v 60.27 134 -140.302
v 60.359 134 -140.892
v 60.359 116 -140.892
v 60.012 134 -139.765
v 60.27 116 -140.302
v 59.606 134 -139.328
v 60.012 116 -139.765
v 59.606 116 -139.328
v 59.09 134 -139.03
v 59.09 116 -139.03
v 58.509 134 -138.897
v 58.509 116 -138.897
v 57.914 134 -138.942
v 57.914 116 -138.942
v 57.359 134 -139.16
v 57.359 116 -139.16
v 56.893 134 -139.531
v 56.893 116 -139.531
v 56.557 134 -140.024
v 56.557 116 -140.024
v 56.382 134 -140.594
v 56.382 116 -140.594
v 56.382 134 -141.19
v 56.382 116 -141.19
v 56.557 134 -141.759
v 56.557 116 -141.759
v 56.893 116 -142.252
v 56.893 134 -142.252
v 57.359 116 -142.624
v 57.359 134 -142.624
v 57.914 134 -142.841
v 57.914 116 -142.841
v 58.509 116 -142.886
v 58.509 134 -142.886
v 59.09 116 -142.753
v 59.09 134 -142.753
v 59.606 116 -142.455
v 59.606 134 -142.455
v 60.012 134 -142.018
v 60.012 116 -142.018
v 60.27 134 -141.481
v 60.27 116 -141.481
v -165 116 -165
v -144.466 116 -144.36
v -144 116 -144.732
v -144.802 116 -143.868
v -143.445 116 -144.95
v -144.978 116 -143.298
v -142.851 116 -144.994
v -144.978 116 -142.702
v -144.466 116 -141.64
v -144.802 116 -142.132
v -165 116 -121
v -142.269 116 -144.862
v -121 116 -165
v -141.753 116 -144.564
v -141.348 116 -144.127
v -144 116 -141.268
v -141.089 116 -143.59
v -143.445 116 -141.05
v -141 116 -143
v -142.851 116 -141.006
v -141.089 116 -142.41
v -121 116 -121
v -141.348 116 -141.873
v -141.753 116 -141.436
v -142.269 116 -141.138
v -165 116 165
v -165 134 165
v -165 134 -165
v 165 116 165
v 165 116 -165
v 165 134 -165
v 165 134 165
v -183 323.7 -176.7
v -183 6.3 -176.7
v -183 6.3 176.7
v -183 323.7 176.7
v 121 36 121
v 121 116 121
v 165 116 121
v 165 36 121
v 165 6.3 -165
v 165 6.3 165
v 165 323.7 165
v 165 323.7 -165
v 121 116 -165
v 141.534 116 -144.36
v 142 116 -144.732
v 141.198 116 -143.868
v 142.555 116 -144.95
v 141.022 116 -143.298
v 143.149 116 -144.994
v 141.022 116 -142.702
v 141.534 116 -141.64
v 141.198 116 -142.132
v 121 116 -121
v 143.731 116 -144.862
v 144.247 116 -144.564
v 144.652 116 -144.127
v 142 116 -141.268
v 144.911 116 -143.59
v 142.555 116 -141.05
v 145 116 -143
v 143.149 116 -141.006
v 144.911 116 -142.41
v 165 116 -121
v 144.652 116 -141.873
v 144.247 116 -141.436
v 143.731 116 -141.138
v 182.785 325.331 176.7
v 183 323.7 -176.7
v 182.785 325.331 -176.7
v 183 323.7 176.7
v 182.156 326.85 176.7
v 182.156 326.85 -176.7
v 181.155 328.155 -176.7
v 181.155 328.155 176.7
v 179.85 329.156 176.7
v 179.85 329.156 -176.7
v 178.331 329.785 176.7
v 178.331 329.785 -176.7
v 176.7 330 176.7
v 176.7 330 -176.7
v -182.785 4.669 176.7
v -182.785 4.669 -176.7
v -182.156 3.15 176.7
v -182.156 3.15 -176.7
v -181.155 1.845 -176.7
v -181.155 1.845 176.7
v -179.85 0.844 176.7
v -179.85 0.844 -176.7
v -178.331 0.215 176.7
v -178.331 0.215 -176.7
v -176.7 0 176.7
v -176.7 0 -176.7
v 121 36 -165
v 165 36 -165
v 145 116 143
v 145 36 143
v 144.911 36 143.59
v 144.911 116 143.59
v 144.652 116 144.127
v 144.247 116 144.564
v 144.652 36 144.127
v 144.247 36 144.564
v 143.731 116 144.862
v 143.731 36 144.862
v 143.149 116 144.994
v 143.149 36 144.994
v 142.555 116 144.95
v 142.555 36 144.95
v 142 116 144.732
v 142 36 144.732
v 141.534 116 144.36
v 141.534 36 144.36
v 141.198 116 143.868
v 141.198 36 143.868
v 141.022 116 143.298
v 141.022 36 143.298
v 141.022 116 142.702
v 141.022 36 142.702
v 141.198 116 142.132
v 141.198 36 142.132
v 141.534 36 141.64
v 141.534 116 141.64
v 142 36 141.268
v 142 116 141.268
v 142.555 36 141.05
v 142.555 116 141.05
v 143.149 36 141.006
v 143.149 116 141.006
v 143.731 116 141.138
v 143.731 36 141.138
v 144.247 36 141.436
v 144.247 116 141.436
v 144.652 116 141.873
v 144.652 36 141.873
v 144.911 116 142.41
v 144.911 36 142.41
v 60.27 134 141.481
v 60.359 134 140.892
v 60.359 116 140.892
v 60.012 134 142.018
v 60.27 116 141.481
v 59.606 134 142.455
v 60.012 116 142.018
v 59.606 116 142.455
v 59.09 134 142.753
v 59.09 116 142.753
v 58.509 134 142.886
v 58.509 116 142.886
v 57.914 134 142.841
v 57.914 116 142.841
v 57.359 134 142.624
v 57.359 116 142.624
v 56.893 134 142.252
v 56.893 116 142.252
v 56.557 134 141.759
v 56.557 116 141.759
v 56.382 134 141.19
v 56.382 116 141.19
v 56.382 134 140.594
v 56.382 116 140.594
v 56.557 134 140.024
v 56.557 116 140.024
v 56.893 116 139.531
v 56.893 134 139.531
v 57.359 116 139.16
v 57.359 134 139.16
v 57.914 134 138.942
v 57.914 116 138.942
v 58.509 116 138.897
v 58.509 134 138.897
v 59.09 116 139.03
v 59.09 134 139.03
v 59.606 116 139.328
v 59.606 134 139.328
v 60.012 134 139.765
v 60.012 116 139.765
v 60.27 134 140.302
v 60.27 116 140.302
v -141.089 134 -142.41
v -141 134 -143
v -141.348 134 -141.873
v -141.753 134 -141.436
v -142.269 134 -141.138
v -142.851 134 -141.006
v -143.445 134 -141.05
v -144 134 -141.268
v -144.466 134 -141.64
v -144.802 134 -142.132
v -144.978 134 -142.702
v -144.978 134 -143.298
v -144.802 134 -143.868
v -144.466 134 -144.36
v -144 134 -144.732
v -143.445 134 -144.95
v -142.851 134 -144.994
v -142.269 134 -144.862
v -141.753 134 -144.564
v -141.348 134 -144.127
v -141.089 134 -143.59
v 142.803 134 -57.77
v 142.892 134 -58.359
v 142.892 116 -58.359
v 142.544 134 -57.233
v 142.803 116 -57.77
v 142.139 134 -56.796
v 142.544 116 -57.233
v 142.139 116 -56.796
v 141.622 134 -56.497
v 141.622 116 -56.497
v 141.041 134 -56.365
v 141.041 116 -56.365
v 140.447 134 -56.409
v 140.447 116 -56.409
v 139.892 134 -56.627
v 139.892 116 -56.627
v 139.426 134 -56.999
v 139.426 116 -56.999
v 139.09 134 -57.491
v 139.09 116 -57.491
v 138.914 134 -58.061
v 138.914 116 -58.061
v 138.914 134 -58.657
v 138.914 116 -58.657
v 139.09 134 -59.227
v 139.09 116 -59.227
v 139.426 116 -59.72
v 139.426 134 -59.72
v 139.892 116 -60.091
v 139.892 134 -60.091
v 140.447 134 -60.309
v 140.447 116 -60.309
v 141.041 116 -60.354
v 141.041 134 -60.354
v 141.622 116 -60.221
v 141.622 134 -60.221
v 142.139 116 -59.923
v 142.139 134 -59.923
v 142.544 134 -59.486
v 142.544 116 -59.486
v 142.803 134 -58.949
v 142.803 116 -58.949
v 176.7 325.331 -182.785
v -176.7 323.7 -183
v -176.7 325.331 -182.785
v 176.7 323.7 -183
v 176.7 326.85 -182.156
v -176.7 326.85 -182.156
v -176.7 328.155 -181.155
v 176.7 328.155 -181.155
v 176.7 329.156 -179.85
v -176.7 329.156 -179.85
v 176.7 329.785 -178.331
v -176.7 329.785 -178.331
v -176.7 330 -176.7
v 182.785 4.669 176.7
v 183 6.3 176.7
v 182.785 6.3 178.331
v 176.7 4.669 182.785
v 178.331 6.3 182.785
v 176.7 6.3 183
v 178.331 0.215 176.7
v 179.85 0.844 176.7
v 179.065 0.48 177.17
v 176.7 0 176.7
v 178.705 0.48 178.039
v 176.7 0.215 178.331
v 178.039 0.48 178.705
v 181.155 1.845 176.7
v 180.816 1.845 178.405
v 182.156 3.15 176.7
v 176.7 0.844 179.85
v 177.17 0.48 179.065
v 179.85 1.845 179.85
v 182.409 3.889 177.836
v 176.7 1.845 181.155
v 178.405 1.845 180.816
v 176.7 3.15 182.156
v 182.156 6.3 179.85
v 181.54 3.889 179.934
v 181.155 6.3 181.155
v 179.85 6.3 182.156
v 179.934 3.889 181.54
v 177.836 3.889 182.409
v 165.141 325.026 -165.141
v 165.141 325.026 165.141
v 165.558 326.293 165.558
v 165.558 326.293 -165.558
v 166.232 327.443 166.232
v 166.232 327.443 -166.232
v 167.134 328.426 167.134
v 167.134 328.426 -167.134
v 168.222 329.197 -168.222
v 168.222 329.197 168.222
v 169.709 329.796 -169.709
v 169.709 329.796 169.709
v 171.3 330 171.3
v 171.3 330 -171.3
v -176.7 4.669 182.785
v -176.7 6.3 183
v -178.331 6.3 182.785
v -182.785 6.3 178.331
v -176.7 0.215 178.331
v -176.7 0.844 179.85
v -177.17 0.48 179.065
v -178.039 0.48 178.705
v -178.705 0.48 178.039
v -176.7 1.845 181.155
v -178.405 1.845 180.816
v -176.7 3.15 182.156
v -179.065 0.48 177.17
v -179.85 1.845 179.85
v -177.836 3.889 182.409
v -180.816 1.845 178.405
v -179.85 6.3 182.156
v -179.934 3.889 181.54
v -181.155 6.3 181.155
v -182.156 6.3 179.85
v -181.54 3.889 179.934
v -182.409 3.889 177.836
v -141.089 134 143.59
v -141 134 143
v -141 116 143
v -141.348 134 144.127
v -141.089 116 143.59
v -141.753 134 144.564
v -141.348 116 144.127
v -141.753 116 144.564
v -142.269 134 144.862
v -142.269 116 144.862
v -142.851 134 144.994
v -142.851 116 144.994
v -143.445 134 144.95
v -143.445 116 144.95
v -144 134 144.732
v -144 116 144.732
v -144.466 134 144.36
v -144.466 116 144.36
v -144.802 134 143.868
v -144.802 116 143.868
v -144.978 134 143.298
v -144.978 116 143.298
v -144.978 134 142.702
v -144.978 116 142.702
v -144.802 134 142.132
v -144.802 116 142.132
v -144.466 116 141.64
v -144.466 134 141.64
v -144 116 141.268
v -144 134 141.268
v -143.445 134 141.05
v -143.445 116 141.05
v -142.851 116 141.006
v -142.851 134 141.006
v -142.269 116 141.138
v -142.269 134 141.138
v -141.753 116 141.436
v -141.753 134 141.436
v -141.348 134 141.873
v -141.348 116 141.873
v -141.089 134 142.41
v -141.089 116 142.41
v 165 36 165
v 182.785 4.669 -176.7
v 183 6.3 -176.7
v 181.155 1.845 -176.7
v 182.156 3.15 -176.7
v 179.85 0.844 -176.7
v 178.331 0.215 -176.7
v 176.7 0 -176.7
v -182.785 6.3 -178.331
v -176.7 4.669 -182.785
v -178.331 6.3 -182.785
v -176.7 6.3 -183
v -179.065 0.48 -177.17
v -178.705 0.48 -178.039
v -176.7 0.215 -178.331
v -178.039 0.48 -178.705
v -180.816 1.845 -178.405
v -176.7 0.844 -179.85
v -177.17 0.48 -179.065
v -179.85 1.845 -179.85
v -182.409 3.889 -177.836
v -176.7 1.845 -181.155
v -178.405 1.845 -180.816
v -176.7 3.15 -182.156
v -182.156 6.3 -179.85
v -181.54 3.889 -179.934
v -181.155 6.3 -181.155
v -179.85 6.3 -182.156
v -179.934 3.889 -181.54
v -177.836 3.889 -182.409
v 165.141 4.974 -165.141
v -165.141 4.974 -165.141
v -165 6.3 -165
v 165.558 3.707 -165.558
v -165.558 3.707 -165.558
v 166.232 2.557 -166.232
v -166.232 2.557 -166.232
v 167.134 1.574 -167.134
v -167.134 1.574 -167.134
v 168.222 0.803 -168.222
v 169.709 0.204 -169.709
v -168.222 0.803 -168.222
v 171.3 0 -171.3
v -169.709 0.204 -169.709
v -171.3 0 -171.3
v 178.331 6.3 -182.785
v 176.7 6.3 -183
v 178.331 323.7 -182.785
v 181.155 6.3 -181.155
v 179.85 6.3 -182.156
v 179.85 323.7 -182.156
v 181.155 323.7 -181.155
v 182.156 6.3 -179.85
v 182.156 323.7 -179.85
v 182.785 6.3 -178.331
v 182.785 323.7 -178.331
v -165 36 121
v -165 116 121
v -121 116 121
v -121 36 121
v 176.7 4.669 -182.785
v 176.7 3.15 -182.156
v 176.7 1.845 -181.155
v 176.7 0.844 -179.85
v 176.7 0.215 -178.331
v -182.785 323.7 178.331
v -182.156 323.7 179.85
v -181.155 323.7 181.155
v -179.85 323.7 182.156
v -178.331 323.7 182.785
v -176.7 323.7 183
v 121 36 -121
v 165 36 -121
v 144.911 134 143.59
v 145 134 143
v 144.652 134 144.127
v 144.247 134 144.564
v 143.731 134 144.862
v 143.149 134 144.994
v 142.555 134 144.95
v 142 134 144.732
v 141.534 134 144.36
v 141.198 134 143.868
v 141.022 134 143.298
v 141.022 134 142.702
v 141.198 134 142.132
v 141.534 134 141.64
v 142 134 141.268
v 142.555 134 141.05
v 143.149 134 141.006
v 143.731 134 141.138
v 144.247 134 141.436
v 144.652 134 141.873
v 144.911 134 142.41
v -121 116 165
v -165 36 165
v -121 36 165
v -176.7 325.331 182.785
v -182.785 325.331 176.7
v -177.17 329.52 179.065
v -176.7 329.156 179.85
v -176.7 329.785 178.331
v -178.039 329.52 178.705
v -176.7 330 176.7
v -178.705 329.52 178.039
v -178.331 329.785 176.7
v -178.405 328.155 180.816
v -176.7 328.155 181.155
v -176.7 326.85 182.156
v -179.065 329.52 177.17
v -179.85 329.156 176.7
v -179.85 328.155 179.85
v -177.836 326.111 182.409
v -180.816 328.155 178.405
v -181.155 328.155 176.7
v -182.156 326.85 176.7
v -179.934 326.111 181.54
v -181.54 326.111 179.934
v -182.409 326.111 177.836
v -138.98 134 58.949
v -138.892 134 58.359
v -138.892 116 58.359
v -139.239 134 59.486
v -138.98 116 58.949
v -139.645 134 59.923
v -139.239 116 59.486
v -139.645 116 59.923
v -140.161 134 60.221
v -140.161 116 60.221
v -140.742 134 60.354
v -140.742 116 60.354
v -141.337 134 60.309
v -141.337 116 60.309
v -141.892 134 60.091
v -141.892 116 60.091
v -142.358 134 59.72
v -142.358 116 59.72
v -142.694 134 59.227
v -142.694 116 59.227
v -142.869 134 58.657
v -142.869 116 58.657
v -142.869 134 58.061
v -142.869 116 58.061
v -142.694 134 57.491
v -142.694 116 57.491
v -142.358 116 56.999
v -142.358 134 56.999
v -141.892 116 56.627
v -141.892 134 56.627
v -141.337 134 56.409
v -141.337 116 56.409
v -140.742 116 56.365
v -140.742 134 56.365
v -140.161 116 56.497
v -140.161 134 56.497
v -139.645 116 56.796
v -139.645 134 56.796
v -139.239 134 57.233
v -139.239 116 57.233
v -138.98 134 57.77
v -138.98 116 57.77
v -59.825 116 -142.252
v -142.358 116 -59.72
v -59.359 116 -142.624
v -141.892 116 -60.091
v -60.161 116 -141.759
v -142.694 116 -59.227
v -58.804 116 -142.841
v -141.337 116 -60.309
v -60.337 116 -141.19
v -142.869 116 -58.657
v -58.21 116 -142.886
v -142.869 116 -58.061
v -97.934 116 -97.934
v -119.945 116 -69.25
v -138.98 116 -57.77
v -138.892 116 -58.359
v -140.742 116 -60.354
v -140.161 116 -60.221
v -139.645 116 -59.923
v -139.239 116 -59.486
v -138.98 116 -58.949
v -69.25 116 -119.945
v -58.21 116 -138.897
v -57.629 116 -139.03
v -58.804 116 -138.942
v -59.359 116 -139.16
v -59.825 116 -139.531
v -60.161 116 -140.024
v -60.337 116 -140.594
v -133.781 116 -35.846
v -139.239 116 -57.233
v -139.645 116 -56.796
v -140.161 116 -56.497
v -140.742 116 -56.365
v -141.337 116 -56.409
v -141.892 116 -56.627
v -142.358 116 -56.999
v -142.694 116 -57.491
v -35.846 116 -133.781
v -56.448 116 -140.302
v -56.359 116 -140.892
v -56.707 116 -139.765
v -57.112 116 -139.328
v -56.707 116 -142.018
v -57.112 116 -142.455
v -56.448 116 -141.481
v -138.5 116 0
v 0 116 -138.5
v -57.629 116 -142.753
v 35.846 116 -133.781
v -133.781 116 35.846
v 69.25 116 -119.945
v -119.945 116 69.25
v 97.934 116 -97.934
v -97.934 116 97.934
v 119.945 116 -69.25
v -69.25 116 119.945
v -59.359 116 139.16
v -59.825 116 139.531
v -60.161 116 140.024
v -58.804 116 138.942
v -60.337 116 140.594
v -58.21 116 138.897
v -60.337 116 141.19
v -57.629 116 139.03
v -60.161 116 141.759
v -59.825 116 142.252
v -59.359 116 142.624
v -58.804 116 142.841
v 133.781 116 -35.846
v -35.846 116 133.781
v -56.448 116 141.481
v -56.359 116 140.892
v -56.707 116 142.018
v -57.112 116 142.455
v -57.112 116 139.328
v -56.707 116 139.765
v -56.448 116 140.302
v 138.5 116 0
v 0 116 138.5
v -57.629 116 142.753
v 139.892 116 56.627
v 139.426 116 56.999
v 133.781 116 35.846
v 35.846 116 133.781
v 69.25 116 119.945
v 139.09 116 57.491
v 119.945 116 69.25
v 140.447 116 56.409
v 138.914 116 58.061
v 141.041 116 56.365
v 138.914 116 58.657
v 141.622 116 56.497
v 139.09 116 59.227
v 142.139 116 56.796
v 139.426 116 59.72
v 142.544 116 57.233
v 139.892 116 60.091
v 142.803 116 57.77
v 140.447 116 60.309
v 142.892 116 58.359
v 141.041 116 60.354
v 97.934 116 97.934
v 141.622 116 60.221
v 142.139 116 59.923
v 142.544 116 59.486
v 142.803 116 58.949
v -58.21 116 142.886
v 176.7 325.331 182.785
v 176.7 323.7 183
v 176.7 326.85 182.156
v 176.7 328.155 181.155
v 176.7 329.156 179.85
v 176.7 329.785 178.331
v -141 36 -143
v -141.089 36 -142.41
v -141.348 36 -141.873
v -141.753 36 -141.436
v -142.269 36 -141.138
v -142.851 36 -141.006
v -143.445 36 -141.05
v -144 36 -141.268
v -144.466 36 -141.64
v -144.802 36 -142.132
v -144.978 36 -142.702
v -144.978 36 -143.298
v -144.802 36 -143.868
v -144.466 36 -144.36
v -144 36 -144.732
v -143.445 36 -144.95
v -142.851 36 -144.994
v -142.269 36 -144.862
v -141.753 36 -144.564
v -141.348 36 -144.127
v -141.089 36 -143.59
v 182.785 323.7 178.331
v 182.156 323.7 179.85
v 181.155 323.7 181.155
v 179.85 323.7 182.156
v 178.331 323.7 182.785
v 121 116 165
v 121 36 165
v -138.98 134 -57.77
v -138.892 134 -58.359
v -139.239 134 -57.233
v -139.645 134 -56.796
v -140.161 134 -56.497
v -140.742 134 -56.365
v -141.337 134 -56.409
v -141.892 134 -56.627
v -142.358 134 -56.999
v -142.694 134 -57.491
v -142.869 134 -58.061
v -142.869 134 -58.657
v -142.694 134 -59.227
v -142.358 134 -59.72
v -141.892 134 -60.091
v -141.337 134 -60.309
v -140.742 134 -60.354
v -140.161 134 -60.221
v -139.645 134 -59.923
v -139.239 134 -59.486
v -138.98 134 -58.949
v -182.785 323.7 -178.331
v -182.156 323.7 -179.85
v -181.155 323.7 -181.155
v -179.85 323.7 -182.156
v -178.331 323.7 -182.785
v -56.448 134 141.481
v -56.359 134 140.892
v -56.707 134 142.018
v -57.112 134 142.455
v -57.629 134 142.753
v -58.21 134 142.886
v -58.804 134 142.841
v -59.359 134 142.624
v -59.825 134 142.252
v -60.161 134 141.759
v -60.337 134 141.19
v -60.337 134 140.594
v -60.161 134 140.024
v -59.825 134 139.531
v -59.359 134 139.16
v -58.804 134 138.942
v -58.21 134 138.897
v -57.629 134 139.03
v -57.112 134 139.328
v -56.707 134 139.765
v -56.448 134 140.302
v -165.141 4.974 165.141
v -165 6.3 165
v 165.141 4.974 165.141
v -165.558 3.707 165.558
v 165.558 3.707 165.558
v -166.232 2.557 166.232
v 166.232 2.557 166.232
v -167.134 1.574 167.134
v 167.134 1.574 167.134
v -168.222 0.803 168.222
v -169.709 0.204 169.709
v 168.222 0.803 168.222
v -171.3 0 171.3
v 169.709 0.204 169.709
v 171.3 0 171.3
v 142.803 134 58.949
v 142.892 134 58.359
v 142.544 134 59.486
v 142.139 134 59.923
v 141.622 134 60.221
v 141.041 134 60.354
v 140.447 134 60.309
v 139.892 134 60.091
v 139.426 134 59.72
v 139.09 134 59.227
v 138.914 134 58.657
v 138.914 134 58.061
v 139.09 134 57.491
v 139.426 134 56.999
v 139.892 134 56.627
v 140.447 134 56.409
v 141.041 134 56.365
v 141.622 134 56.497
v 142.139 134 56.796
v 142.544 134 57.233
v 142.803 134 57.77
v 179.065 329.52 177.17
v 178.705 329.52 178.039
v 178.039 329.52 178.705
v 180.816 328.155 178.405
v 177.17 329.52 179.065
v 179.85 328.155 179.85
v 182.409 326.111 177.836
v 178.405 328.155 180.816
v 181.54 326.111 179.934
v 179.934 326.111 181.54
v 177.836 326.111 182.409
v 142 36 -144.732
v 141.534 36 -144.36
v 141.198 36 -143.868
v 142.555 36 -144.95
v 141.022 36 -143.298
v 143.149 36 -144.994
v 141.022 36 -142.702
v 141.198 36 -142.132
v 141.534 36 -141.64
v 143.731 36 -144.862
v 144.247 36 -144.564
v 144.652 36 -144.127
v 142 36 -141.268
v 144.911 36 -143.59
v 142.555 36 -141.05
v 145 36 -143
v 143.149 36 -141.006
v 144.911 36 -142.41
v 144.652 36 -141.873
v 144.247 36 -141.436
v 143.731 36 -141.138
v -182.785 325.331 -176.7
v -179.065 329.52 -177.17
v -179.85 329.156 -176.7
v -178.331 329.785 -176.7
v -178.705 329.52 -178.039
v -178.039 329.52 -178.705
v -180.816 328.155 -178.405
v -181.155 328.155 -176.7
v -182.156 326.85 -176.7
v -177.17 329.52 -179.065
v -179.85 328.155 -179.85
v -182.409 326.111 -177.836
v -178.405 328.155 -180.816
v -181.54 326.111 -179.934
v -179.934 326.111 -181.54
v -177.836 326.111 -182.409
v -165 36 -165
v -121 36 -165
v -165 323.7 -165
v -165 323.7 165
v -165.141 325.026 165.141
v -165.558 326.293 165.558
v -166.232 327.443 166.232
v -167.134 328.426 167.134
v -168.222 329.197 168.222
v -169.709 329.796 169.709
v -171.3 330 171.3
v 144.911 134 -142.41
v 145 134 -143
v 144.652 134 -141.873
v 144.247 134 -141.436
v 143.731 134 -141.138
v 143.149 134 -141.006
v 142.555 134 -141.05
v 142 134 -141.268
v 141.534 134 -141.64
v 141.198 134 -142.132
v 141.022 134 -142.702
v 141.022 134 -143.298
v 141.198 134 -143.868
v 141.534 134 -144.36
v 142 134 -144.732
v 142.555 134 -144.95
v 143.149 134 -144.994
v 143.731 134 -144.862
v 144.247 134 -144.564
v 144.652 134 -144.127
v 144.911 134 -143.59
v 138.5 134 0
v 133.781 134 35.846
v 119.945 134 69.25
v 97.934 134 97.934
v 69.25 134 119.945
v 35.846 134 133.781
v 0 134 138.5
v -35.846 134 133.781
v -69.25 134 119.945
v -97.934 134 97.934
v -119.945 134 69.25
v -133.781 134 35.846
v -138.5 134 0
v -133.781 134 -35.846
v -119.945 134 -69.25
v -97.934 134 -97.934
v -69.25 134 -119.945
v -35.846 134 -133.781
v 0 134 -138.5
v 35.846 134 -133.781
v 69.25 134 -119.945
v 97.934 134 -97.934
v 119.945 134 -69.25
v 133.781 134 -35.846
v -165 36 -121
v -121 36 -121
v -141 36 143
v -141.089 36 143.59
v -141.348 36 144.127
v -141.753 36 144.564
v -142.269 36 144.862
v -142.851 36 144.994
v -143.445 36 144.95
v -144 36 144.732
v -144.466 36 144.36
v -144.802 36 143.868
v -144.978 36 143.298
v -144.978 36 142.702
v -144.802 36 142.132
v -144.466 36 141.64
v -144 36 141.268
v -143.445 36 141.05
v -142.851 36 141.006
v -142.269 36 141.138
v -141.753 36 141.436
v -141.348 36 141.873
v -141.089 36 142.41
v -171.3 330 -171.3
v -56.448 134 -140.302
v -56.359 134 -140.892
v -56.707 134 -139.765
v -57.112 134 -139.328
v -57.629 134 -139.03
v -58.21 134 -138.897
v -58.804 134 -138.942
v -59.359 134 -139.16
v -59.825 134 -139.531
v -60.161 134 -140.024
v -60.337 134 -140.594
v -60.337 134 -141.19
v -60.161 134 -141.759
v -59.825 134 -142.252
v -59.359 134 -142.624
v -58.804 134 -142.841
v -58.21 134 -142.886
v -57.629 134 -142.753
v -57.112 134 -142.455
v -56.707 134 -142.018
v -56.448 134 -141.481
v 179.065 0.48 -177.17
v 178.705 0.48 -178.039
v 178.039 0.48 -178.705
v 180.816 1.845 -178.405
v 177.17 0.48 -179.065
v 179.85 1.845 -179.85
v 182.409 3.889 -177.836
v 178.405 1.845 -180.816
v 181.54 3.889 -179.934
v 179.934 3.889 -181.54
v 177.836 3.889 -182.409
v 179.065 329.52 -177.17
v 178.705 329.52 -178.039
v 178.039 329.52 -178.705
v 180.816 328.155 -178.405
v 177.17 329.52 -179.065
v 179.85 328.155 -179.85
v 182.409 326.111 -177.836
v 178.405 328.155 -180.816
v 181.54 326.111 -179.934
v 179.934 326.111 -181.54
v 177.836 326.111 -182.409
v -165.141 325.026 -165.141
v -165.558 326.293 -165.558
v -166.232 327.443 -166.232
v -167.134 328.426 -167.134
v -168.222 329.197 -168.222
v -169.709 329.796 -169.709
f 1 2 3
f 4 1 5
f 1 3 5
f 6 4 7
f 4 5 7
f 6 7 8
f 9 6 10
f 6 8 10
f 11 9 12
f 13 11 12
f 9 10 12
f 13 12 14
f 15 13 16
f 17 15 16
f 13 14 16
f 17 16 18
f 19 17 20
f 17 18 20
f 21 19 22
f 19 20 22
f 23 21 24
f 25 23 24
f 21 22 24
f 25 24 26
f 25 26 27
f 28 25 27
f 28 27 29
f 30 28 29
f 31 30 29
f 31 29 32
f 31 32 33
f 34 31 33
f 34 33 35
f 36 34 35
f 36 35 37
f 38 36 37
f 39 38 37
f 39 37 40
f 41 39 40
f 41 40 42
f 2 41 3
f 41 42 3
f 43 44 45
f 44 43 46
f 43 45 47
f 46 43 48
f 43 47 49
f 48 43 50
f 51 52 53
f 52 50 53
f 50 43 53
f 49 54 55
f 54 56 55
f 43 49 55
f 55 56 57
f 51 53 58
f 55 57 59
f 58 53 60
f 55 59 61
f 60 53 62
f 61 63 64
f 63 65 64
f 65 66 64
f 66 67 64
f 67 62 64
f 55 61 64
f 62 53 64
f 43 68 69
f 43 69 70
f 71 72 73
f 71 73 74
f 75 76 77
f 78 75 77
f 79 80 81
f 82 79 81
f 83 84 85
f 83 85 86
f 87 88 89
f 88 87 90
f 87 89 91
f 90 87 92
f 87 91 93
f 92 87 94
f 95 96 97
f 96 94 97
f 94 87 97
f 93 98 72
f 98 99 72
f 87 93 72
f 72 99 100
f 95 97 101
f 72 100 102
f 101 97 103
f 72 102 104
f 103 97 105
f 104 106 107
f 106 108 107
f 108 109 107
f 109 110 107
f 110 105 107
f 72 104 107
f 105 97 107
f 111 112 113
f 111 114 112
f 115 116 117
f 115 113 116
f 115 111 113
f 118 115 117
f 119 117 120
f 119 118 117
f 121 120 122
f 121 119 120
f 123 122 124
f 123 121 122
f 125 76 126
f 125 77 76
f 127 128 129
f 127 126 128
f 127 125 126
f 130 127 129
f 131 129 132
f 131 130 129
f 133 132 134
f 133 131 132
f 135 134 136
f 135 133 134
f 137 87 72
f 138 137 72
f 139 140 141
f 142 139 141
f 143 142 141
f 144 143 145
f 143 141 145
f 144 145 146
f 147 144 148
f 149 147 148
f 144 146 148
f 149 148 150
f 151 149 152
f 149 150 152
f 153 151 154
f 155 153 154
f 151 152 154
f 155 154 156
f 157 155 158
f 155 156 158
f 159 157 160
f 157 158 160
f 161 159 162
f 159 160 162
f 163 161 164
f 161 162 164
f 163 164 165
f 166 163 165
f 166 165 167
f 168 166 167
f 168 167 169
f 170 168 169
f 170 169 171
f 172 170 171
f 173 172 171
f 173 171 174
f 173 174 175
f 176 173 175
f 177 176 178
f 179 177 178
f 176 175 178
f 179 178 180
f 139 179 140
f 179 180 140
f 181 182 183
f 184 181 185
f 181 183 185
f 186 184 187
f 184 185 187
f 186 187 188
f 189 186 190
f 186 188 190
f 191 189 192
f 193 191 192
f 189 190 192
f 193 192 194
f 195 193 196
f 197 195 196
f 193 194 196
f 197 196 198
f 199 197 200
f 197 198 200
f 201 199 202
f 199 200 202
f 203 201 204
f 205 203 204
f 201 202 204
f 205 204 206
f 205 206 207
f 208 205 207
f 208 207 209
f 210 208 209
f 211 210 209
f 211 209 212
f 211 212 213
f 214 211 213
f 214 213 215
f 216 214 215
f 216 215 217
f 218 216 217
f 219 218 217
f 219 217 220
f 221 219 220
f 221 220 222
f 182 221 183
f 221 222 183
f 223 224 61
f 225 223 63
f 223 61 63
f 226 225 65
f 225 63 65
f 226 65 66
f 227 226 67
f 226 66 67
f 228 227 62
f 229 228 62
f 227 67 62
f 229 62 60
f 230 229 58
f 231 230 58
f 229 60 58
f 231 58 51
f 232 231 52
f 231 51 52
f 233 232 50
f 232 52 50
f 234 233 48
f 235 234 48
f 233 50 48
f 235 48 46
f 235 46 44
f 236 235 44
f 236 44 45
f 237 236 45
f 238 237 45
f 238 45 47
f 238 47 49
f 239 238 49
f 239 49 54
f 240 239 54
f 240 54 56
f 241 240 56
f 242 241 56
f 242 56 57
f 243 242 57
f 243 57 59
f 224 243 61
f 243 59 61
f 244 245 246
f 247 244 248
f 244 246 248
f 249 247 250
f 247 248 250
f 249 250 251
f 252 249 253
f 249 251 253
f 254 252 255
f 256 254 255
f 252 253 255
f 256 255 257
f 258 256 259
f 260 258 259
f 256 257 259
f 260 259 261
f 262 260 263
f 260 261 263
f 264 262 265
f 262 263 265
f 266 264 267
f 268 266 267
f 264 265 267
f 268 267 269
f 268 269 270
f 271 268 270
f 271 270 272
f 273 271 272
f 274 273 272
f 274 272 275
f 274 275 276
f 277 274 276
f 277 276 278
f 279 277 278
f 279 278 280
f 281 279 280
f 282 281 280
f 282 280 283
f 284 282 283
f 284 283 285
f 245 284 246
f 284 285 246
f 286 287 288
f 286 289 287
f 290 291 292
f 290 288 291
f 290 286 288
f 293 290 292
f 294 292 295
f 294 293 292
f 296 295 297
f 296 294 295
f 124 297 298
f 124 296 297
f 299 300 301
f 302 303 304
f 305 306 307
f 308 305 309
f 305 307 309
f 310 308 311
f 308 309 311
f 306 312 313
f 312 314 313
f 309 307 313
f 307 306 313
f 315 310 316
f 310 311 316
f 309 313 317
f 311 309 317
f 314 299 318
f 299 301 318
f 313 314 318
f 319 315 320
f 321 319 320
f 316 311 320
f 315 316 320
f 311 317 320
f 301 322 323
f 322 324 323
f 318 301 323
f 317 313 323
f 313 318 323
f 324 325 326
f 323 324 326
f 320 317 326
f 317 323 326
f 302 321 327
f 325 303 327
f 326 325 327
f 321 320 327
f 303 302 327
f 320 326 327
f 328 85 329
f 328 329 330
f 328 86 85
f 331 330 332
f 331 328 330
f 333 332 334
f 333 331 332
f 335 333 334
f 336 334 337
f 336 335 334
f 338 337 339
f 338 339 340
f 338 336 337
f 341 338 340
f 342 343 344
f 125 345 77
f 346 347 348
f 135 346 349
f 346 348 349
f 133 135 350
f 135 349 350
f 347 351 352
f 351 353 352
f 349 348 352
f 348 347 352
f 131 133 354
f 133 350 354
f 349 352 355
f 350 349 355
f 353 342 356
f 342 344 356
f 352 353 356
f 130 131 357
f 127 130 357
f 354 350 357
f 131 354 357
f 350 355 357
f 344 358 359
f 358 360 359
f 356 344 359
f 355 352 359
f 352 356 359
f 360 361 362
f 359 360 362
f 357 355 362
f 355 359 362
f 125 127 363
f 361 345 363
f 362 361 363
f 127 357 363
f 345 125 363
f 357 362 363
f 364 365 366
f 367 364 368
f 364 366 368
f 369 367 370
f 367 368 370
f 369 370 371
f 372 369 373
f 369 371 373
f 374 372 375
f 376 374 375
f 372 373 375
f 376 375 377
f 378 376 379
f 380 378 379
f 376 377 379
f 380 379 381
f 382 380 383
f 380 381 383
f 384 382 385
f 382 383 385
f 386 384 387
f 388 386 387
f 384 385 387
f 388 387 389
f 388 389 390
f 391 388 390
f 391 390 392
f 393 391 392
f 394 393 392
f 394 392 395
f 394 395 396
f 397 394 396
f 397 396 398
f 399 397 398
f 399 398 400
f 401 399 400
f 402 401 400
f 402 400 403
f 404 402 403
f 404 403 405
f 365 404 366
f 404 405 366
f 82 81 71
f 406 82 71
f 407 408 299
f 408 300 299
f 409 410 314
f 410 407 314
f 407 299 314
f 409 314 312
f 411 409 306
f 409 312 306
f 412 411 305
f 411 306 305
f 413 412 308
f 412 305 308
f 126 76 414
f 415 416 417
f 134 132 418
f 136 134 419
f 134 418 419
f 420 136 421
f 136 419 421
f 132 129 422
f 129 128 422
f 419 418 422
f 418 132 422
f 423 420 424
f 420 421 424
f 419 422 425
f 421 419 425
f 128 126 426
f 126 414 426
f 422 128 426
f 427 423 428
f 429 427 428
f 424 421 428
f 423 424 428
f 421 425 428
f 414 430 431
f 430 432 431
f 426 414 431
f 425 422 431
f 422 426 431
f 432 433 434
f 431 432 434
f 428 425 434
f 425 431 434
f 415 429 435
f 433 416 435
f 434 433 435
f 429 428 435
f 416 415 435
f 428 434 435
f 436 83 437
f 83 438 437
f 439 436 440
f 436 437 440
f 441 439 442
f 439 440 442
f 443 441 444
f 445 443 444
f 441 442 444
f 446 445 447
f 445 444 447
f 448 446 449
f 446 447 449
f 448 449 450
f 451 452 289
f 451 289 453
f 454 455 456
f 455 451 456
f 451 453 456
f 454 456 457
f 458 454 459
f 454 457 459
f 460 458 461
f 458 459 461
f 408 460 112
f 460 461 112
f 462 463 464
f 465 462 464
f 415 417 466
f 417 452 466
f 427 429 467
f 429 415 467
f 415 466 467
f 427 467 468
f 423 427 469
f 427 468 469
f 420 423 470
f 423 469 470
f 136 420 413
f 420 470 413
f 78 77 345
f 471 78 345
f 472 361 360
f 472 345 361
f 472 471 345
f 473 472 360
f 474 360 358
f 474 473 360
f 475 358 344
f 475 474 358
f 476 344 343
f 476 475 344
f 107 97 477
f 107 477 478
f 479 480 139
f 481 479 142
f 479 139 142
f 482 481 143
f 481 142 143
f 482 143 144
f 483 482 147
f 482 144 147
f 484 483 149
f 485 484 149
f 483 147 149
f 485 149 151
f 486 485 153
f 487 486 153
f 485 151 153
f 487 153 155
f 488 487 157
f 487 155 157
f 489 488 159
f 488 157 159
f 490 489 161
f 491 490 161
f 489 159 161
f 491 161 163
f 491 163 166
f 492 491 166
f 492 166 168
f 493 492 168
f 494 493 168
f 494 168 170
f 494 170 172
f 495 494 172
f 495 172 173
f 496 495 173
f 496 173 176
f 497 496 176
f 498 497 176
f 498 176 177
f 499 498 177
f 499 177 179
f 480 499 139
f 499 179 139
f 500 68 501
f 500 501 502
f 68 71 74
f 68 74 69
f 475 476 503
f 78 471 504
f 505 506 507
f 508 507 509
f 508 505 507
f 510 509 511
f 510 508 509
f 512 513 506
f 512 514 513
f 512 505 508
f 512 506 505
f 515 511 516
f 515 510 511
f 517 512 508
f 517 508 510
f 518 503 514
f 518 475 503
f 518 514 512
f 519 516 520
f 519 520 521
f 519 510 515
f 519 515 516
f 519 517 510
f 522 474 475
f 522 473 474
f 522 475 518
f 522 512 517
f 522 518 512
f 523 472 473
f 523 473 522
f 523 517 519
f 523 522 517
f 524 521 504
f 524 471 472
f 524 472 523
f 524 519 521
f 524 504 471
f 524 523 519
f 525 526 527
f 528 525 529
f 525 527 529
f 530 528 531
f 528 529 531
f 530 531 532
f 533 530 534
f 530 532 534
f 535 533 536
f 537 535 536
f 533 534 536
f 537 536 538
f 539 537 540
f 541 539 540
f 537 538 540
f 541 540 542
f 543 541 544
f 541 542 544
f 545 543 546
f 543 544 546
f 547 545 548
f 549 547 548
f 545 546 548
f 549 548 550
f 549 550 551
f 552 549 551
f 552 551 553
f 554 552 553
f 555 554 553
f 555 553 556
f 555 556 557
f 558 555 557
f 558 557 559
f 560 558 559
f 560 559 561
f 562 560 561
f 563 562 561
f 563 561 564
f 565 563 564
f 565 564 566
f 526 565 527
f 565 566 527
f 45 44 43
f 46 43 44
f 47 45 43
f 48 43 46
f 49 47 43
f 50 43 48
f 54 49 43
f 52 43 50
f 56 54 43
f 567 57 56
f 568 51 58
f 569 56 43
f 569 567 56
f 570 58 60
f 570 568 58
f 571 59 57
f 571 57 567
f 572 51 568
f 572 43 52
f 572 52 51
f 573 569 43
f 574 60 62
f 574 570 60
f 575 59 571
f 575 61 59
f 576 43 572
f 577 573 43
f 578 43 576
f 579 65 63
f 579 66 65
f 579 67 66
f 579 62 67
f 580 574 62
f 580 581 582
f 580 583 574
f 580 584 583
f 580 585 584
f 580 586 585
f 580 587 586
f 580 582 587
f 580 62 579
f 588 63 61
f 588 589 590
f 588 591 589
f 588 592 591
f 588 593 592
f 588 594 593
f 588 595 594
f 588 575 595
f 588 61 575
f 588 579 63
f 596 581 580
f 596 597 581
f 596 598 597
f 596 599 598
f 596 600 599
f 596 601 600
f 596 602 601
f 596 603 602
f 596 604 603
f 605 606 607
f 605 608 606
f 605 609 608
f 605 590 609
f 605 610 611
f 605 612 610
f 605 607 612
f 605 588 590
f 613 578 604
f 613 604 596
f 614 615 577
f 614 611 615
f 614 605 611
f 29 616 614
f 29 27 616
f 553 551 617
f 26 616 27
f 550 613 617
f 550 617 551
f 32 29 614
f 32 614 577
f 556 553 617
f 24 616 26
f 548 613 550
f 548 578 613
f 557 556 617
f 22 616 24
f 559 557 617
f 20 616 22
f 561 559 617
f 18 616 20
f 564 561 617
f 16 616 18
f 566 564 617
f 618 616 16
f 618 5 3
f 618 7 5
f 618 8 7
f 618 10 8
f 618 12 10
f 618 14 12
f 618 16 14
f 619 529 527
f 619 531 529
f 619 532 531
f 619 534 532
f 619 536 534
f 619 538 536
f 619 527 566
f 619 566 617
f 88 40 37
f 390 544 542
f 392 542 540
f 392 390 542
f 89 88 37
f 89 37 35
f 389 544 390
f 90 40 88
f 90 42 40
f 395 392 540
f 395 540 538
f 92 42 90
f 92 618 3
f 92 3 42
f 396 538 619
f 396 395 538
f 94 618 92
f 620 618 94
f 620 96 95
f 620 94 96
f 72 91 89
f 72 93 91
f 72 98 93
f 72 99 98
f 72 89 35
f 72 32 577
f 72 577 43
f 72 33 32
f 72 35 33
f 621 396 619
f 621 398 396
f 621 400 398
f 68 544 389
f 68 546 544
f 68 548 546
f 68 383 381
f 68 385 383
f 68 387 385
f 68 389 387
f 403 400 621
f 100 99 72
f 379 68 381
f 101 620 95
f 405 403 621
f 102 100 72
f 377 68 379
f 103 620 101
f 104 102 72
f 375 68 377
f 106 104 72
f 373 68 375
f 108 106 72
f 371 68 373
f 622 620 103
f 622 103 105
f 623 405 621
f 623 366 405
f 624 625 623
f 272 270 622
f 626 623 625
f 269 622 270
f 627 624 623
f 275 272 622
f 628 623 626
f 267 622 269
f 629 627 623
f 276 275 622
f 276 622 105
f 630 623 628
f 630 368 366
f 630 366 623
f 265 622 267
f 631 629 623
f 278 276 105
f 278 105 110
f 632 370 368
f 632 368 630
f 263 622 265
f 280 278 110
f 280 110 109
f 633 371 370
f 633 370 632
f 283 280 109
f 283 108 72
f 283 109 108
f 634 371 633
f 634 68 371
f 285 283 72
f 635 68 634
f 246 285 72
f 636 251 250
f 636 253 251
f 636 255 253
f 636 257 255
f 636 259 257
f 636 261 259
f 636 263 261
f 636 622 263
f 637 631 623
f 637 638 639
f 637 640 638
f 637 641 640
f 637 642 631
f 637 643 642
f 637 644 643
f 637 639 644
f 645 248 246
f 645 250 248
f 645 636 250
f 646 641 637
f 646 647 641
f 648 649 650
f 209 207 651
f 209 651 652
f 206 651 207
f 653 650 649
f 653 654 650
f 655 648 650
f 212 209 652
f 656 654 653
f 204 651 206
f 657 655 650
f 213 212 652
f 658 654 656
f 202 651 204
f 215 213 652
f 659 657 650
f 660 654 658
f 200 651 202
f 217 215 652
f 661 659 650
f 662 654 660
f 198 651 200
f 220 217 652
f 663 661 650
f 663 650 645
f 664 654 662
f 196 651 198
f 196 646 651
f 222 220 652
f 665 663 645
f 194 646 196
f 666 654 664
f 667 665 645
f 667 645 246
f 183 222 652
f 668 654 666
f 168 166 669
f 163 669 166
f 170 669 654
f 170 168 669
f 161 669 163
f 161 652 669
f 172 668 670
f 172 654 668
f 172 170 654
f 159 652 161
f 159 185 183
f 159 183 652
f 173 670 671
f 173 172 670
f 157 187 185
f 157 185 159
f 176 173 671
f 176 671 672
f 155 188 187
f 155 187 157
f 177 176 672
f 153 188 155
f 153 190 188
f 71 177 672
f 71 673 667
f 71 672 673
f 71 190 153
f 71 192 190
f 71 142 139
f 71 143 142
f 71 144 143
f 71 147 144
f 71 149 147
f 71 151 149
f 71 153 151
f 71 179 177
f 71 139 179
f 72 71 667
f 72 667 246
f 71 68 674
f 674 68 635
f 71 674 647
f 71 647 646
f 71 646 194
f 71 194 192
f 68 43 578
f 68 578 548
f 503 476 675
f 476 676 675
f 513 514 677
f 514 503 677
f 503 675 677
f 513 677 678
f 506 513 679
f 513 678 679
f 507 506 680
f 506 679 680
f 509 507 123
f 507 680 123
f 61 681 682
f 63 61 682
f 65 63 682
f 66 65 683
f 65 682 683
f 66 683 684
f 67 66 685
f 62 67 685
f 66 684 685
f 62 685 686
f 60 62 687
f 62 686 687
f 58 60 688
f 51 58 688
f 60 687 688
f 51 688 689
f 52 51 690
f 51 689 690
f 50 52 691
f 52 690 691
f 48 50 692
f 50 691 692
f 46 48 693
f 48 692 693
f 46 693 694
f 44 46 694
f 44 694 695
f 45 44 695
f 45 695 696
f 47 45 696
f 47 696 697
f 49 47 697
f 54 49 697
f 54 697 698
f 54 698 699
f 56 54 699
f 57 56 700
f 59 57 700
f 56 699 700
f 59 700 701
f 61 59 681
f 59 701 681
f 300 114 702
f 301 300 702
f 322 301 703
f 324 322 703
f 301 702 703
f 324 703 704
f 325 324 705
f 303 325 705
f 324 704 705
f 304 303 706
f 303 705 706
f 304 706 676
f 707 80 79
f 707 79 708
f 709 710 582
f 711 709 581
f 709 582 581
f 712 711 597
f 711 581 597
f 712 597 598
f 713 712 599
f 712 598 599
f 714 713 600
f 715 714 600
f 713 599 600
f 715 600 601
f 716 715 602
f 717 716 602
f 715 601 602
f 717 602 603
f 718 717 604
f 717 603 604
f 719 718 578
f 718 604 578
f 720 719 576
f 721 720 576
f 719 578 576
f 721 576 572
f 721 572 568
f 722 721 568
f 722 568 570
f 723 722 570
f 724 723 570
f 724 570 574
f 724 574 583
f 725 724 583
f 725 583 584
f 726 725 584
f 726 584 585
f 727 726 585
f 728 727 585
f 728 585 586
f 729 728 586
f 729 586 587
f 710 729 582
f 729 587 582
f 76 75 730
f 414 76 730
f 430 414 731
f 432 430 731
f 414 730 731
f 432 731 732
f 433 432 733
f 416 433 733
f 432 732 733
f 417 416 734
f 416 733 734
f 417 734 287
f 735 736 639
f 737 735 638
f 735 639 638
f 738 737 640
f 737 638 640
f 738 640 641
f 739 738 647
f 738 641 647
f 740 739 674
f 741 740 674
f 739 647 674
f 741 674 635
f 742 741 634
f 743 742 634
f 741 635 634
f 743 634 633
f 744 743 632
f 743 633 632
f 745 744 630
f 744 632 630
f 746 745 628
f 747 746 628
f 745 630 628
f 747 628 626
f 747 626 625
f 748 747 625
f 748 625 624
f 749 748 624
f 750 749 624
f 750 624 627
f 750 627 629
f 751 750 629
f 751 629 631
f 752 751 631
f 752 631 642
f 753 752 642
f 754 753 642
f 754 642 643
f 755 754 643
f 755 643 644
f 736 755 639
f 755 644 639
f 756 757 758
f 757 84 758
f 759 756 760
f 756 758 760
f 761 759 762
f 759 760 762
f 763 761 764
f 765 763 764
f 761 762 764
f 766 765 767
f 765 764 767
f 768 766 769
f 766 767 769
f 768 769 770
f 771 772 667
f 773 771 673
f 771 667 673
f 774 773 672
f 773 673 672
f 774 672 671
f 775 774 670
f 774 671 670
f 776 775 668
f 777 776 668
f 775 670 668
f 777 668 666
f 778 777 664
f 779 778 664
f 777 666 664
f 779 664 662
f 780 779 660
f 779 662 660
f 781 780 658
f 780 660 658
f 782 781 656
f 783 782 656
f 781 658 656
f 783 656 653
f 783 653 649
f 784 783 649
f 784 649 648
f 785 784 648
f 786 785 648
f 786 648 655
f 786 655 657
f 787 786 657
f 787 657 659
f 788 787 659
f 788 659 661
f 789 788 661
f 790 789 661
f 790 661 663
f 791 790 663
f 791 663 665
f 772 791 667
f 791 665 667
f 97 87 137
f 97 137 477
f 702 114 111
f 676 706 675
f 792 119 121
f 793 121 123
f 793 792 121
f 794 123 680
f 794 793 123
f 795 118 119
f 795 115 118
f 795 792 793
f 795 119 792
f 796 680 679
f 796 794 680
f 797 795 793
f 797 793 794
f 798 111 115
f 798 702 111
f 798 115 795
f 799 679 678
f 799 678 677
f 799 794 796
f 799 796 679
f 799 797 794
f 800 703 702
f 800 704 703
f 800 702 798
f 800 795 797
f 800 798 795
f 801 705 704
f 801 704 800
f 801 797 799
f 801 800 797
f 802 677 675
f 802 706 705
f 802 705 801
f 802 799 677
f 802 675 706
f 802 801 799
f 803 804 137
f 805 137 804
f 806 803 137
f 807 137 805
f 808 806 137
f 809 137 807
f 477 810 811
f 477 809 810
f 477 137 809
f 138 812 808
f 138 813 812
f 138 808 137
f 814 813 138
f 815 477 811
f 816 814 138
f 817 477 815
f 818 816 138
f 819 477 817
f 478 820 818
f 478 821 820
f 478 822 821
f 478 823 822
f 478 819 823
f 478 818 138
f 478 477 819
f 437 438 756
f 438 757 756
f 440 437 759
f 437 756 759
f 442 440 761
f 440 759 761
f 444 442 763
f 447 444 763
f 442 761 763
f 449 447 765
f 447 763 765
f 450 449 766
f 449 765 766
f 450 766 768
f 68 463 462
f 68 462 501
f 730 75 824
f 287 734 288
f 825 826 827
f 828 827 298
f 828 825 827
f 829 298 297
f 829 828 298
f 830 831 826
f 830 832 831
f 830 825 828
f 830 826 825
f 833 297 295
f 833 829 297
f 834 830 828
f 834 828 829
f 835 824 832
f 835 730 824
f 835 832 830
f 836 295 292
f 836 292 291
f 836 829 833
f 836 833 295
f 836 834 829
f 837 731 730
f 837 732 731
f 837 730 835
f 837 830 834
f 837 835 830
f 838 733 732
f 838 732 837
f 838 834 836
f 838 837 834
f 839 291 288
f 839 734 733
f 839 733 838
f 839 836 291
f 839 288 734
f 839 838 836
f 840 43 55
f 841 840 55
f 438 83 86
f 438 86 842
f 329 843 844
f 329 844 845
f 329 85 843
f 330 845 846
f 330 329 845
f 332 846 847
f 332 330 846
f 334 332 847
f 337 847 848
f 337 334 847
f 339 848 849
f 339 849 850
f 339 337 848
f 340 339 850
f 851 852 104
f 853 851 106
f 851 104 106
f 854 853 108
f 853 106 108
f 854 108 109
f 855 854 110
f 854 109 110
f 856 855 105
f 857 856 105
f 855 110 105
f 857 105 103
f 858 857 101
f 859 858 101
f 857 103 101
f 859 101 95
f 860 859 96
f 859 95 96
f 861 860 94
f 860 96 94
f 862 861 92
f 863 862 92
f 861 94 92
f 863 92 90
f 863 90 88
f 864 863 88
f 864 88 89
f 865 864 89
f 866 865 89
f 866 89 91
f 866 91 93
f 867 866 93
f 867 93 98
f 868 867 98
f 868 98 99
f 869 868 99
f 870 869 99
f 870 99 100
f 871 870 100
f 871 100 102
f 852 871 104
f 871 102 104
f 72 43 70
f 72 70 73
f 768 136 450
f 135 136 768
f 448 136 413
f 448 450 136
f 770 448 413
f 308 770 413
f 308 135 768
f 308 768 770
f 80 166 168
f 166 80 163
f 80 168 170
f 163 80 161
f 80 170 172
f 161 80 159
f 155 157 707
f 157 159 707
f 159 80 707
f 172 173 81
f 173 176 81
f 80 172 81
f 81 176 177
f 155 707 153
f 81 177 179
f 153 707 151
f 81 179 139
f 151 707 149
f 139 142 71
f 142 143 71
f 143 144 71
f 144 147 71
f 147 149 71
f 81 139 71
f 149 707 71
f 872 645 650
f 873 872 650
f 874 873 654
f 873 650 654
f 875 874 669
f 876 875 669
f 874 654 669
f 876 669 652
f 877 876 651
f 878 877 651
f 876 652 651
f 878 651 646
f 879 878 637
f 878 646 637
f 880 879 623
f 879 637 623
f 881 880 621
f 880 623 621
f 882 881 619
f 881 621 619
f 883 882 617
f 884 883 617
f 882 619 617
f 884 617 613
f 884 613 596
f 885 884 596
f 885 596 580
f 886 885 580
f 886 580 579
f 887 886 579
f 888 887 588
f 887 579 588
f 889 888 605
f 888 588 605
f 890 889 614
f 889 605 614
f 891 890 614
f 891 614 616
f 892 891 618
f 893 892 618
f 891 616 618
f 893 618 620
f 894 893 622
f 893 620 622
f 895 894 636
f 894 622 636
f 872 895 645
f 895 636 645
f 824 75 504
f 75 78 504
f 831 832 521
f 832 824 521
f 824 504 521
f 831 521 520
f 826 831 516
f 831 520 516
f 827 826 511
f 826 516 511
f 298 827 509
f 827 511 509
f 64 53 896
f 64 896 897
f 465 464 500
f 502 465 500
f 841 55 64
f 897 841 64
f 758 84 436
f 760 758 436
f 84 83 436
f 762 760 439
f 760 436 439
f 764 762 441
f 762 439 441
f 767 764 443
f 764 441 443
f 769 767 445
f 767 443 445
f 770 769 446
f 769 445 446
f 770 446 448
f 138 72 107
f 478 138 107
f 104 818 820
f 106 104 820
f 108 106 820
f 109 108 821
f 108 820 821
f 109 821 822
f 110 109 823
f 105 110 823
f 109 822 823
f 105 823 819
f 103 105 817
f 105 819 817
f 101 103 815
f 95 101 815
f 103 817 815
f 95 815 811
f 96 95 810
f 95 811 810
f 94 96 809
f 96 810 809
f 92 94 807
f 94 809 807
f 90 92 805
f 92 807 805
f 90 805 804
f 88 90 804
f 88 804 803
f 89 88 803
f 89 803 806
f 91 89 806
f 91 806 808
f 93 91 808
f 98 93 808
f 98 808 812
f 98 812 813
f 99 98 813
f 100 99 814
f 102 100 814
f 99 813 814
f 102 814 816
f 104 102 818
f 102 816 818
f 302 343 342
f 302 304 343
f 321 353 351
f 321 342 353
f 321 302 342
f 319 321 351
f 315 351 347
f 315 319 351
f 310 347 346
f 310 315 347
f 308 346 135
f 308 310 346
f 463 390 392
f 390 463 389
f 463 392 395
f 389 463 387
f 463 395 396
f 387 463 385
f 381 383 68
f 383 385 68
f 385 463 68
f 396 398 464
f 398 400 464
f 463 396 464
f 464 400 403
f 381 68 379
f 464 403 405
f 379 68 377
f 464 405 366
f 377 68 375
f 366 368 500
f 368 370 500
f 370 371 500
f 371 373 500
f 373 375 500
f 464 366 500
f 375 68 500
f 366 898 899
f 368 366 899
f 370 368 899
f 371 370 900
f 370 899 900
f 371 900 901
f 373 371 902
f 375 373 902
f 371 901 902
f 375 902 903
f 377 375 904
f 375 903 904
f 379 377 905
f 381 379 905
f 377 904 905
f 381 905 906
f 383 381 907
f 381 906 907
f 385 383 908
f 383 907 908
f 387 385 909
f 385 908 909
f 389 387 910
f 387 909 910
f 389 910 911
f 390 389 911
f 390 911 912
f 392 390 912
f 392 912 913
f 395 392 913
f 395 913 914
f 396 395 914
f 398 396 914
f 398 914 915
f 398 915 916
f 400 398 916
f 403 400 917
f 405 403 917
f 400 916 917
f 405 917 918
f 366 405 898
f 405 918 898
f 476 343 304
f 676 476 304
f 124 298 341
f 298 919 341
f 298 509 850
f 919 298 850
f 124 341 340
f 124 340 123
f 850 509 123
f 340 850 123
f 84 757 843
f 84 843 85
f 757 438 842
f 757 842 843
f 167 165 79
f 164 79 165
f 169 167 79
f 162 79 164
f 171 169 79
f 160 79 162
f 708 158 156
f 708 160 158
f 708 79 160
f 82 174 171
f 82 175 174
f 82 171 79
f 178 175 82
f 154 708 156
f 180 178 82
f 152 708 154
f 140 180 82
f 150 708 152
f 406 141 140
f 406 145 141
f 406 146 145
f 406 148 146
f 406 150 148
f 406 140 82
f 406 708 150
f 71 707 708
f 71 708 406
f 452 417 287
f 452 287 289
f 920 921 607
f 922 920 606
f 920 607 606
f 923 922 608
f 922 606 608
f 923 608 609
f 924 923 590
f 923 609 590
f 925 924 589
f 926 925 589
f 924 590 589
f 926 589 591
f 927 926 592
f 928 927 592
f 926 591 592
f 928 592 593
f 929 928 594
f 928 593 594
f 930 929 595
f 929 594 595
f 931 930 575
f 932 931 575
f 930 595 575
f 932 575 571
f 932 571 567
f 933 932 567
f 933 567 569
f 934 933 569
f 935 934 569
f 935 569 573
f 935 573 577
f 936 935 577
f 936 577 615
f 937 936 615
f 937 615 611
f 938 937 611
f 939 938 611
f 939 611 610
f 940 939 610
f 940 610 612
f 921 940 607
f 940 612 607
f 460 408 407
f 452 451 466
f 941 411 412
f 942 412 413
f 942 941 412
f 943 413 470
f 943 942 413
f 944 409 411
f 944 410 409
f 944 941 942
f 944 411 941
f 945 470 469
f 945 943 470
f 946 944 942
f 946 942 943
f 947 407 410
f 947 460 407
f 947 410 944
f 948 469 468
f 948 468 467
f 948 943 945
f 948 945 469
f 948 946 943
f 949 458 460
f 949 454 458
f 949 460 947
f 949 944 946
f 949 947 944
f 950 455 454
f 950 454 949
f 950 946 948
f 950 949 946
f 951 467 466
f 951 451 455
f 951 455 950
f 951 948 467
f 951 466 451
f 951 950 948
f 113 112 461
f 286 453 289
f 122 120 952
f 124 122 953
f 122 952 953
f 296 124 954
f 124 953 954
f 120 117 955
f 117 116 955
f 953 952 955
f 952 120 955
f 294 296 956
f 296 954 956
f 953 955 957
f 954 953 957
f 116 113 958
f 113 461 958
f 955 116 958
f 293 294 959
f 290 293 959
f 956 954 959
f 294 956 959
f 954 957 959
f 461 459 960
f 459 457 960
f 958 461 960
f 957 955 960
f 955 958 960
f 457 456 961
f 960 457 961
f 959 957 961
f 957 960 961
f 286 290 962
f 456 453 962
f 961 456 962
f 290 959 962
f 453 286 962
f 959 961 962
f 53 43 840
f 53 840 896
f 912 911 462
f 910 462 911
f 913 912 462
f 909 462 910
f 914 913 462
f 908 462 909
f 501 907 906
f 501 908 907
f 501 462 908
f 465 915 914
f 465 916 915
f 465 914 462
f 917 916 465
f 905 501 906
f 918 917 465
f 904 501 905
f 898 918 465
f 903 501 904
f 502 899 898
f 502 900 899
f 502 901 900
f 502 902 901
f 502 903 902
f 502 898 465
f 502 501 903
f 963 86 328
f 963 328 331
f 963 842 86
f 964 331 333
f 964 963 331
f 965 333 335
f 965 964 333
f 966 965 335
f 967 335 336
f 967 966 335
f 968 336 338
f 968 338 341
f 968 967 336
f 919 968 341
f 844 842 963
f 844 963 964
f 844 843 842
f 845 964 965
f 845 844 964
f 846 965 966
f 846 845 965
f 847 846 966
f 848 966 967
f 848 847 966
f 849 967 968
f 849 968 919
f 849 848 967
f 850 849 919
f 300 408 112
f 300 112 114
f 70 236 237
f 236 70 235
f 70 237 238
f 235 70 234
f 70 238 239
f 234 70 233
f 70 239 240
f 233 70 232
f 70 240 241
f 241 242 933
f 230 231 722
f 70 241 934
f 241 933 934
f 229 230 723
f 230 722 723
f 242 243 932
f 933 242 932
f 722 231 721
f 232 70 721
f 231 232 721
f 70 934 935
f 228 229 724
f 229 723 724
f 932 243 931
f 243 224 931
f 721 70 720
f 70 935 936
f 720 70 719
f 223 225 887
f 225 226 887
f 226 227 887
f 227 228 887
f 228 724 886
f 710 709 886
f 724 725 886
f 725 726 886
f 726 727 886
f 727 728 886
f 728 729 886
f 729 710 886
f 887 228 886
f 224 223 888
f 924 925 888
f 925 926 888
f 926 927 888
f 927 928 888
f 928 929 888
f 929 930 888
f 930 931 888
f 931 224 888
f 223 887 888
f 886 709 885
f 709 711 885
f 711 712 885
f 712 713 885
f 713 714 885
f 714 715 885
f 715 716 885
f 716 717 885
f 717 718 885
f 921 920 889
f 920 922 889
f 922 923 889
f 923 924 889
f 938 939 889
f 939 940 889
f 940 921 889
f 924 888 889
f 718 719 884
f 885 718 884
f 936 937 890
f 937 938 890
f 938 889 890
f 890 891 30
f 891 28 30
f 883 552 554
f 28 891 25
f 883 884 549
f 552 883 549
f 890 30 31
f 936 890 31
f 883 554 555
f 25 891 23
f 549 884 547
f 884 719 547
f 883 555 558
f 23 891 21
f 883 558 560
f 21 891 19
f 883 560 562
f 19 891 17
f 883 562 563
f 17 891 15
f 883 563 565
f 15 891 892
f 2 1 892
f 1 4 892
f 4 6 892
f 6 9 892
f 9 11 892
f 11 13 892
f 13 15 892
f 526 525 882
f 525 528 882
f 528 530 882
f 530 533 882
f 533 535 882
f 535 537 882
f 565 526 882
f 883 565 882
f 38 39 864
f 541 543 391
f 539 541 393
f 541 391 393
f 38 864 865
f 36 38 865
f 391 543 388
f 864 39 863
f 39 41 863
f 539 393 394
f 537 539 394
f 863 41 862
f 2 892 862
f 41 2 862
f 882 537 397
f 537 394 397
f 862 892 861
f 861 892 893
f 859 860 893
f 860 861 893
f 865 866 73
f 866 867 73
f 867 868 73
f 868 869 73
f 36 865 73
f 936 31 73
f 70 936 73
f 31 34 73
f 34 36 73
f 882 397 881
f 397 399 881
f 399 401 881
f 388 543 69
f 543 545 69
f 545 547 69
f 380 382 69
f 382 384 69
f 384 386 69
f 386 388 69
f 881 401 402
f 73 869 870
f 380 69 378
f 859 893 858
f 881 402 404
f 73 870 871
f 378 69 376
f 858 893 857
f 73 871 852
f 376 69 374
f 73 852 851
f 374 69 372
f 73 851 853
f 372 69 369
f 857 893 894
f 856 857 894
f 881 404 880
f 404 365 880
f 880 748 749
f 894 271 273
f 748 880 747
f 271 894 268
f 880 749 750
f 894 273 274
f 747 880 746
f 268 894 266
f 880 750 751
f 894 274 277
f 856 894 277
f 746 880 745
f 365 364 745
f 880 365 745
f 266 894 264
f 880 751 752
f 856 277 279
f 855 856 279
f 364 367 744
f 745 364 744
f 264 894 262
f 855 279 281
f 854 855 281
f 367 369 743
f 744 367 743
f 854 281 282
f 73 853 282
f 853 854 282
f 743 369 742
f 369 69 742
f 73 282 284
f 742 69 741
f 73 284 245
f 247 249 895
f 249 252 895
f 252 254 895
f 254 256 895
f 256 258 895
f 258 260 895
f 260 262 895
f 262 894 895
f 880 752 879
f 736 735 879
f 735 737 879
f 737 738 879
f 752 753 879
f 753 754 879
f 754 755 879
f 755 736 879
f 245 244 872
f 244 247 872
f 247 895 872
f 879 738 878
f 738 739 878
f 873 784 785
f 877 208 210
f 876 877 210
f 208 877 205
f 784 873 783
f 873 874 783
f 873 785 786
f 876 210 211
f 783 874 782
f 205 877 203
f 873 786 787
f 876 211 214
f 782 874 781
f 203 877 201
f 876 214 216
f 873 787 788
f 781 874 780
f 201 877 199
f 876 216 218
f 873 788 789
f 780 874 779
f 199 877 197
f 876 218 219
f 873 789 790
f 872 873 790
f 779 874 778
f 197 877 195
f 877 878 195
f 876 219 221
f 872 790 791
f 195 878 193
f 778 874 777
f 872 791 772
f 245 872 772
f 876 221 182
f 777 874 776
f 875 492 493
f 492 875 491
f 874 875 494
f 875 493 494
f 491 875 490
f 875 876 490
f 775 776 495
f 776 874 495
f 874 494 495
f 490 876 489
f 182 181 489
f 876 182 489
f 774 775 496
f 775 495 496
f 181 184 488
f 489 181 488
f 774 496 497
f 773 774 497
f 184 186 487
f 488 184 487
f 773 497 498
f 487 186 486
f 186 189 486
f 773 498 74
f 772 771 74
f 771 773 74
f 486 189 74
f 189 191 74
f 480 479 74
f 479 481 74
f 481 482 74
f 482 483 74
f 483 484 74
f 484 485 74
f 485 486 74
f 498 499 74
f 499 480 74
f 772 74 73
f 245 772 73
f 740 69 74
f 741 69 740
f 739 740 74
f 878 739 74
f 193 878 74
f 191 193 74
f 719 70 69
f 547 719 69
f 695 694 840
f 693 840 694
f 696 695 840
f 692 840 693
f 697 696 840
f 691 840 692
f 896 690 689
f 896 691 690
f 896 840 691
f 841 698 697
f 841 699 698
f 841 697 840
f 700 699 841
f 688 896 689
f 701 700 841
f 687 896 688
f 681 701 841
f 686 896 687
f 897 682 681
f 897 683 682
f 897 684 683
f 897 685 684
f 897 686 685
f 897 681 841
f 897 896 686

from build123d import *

# Parameters (mm, degrees)
F0_W     = 366
F0_H     = 366
F1_DEPTH = 330
F0_W_2   = 44
F0_H_2   = 44
F0_R     = 2
F0_R_2   = 138.5
F2_DEPTH = 18
F3_DEPTH = 80
F4_R     = 6.3


with BuildPart() as f1:
    # F0 (on Front) → F1 (new body)
    with BuildSketch(Plane.XZ):
        Rectangle(F0_W, F0_H)
        Polygon((165, -121), (165, -165), (121, -165), (-121, -165), (-165, -165), (-165, -121), (-165, 121), (-165, 165), (-121, 165), (121, 165), (165, 165), (165, 121), align=None, mode=Mode.SUBTRACT)
    extrude(amount=-F1_DEPTH)

    # F4
    f4_edges = [f1.edges().sort_by_distance(p)[0] for p in [
        (183, 165, -183),
        (183, 165, 183),
        (183, 0, 0),
        (183, 330, 0),
        (-183, 165, 183),
        (0, 0, 183),
        (0, 330, 183),
        (-183, 165, -183),
        (-183, 0, 0),
        (-183, 330, 0),
        (0, 0, -183),
        (0, 330, -183),
        (165, 0, 0),
        (0, 0, -165),
        (-165, 0, 0),
        (0, 0, 165),
        (0, 330, -165),
        (-165, 330, 0),
        (0, 330, 165),
        (165, 330, 0),
    ]]
    fillet(f4_edges, radius=F4_R)


with BuildPart() as f2:
    # F0 (on Front) → F2 (new body)
    with BuildSketch(Plane.XZ):
        with Locations((143, -143)):
            Rectangle(F0_W_2, F0_H_2)
        with Locations((143, -143)):
            Circle(F0_R, mode=Mode.SUBTRACT)
        Polygon((-121, -165), (121, -165), (121, -121), (165, -121), (165, 121), (121, 121), (121, 165), (-121, 165), (-121, 121), (-165, 121), (-165, -121), (-121, -121), align=None)
        with Locations((-58.3592234357, -140.891628708)):
            Circle(F0_R, mode=Mode.SUBTRACT)
        with Locations((-140.891628708, -58.3592234357)):
            Circle(F0_R, mode=Mode.SUBTRACT)
        with Locations((58.3592234357, -140.891628708)):
            Circle(F0_R, mode=Mode.SUBTRACT)
        with Locations((140.891628708, -58.3592234357)):
            Circle(F0_R, mode=Mode.SUBTRACT)
        with Locations((-140.891628708, 58.3592234357)):
            Circle(F0_R, mode=Mode.SUBTRACT)
        with Locations((-58.3592234357, 140.891628708)):
            Circle(F0_R, mode=Mode.SUBTRACT)
        Circle(F0_R_2, mode=Mode.SUBTRACT)
        with Locations((140.891628708, 58.3592234357)):
            Circle(F0_R, mode=Mode.SUBTRACT)
        with Locations((58.3592234357, 140.891628708)):
            Circle(F0_R, mode=Mode.SUBTRACT)
        with Locations((-143, -143)):
            Rectangle(F0_W_2, F0_H_2)
        with Locations((-143, -143)):
            Circle(F0_R, mode=Mode.SUBTRACT)
        with Locations((-143, 143)):
            Rectangle(F0_W_2, F0_H_2)
        with Locations((-143, 143)):
            Circle(F0_R, mode=Mode.SUBTRACT)
        with Locations((143, 143)):
            Rectangle(F0_W_2, F0_H_2)
        with Locations((143, 143)):
            Circle(F0_R, mode=Mode.SUBTRACT)
    extrude(amount=-F2_DEPTH)


with BuildPart() as f3:
    # F0 (on Front) → F3 (new body)
    with BuildSketch(Plane.XZ):
        with Locations((-143, 143)):
            Rectangle(F0_W_2, F0_H_2)
        with Locations((-143, 143)):
            Circle(F0_R, mode=Mode.SUBTRACT)
    extrude(amount=-F3_DEPTH)


with BuildPart() as f3b:
    # F0 (on Front) → F3, piece 2 (new body)
    with BuildSketch(Plane.XZ):
        with Locations((143, 143)):
            Rectangle(F0_W_2, F0_H_2)
        with Locations((143, 143)):
            Circle(F0_R, mode=Mode.SUBTRACT)
    extrude(amount=-F3_DEPTH)


with BuildPart() as f3c:
    # F0 (on Front) → F3, piece 3 (new body)
    with BuildSketch(Plane.XZ):
        with Locations((143, -143)):
            Rectangle(F0_W_2, F0_H_2)
        with Locations((143, -143)):
            Circle(F0_R, mode=Mode.SUBTRACT)
    extrude(amount=-F3_DEPTH)


with BuildPart() as f3d:
    # F0 (on Front) → F3, piece 4 (new body)
    with BuildSketch(Plane.XZ):
        with Locations((-143, -143)):
            Rectangle(F0_W_2, F0_H_2)
        with Locations((-143, -143)):
            Circle(F0_R, mode=Mode.SUBTRACT)
    extrude(amount=-F3_DEPTH)


with BuildPart() as f3_1:
    # F5: moved
    add(f3.part.moved(Location((0, 36, 0))))


with BuildPart() as f3b_1:
    # F5: moved
    add(f3b.part.moved(Location((0, 36, 0))))


with BuildPart() as f3c_1:
    # F5: moved
    add(f3c.part.moved(Location((0, 36, 0))))


with BuildPart() as f3d_1:
    # F5: moved
    add(f3d.part.moved(Location((0, 36, 0))))


with BuildPart() as f2_1:
    # F6: moved
    add(f2.part.moved(Location((0, 116, 0))))


solid = Compound([f1.part, f3_1.part, f3b_1.part, f3c_1.part, f3d_1.part, f2_1.part])
